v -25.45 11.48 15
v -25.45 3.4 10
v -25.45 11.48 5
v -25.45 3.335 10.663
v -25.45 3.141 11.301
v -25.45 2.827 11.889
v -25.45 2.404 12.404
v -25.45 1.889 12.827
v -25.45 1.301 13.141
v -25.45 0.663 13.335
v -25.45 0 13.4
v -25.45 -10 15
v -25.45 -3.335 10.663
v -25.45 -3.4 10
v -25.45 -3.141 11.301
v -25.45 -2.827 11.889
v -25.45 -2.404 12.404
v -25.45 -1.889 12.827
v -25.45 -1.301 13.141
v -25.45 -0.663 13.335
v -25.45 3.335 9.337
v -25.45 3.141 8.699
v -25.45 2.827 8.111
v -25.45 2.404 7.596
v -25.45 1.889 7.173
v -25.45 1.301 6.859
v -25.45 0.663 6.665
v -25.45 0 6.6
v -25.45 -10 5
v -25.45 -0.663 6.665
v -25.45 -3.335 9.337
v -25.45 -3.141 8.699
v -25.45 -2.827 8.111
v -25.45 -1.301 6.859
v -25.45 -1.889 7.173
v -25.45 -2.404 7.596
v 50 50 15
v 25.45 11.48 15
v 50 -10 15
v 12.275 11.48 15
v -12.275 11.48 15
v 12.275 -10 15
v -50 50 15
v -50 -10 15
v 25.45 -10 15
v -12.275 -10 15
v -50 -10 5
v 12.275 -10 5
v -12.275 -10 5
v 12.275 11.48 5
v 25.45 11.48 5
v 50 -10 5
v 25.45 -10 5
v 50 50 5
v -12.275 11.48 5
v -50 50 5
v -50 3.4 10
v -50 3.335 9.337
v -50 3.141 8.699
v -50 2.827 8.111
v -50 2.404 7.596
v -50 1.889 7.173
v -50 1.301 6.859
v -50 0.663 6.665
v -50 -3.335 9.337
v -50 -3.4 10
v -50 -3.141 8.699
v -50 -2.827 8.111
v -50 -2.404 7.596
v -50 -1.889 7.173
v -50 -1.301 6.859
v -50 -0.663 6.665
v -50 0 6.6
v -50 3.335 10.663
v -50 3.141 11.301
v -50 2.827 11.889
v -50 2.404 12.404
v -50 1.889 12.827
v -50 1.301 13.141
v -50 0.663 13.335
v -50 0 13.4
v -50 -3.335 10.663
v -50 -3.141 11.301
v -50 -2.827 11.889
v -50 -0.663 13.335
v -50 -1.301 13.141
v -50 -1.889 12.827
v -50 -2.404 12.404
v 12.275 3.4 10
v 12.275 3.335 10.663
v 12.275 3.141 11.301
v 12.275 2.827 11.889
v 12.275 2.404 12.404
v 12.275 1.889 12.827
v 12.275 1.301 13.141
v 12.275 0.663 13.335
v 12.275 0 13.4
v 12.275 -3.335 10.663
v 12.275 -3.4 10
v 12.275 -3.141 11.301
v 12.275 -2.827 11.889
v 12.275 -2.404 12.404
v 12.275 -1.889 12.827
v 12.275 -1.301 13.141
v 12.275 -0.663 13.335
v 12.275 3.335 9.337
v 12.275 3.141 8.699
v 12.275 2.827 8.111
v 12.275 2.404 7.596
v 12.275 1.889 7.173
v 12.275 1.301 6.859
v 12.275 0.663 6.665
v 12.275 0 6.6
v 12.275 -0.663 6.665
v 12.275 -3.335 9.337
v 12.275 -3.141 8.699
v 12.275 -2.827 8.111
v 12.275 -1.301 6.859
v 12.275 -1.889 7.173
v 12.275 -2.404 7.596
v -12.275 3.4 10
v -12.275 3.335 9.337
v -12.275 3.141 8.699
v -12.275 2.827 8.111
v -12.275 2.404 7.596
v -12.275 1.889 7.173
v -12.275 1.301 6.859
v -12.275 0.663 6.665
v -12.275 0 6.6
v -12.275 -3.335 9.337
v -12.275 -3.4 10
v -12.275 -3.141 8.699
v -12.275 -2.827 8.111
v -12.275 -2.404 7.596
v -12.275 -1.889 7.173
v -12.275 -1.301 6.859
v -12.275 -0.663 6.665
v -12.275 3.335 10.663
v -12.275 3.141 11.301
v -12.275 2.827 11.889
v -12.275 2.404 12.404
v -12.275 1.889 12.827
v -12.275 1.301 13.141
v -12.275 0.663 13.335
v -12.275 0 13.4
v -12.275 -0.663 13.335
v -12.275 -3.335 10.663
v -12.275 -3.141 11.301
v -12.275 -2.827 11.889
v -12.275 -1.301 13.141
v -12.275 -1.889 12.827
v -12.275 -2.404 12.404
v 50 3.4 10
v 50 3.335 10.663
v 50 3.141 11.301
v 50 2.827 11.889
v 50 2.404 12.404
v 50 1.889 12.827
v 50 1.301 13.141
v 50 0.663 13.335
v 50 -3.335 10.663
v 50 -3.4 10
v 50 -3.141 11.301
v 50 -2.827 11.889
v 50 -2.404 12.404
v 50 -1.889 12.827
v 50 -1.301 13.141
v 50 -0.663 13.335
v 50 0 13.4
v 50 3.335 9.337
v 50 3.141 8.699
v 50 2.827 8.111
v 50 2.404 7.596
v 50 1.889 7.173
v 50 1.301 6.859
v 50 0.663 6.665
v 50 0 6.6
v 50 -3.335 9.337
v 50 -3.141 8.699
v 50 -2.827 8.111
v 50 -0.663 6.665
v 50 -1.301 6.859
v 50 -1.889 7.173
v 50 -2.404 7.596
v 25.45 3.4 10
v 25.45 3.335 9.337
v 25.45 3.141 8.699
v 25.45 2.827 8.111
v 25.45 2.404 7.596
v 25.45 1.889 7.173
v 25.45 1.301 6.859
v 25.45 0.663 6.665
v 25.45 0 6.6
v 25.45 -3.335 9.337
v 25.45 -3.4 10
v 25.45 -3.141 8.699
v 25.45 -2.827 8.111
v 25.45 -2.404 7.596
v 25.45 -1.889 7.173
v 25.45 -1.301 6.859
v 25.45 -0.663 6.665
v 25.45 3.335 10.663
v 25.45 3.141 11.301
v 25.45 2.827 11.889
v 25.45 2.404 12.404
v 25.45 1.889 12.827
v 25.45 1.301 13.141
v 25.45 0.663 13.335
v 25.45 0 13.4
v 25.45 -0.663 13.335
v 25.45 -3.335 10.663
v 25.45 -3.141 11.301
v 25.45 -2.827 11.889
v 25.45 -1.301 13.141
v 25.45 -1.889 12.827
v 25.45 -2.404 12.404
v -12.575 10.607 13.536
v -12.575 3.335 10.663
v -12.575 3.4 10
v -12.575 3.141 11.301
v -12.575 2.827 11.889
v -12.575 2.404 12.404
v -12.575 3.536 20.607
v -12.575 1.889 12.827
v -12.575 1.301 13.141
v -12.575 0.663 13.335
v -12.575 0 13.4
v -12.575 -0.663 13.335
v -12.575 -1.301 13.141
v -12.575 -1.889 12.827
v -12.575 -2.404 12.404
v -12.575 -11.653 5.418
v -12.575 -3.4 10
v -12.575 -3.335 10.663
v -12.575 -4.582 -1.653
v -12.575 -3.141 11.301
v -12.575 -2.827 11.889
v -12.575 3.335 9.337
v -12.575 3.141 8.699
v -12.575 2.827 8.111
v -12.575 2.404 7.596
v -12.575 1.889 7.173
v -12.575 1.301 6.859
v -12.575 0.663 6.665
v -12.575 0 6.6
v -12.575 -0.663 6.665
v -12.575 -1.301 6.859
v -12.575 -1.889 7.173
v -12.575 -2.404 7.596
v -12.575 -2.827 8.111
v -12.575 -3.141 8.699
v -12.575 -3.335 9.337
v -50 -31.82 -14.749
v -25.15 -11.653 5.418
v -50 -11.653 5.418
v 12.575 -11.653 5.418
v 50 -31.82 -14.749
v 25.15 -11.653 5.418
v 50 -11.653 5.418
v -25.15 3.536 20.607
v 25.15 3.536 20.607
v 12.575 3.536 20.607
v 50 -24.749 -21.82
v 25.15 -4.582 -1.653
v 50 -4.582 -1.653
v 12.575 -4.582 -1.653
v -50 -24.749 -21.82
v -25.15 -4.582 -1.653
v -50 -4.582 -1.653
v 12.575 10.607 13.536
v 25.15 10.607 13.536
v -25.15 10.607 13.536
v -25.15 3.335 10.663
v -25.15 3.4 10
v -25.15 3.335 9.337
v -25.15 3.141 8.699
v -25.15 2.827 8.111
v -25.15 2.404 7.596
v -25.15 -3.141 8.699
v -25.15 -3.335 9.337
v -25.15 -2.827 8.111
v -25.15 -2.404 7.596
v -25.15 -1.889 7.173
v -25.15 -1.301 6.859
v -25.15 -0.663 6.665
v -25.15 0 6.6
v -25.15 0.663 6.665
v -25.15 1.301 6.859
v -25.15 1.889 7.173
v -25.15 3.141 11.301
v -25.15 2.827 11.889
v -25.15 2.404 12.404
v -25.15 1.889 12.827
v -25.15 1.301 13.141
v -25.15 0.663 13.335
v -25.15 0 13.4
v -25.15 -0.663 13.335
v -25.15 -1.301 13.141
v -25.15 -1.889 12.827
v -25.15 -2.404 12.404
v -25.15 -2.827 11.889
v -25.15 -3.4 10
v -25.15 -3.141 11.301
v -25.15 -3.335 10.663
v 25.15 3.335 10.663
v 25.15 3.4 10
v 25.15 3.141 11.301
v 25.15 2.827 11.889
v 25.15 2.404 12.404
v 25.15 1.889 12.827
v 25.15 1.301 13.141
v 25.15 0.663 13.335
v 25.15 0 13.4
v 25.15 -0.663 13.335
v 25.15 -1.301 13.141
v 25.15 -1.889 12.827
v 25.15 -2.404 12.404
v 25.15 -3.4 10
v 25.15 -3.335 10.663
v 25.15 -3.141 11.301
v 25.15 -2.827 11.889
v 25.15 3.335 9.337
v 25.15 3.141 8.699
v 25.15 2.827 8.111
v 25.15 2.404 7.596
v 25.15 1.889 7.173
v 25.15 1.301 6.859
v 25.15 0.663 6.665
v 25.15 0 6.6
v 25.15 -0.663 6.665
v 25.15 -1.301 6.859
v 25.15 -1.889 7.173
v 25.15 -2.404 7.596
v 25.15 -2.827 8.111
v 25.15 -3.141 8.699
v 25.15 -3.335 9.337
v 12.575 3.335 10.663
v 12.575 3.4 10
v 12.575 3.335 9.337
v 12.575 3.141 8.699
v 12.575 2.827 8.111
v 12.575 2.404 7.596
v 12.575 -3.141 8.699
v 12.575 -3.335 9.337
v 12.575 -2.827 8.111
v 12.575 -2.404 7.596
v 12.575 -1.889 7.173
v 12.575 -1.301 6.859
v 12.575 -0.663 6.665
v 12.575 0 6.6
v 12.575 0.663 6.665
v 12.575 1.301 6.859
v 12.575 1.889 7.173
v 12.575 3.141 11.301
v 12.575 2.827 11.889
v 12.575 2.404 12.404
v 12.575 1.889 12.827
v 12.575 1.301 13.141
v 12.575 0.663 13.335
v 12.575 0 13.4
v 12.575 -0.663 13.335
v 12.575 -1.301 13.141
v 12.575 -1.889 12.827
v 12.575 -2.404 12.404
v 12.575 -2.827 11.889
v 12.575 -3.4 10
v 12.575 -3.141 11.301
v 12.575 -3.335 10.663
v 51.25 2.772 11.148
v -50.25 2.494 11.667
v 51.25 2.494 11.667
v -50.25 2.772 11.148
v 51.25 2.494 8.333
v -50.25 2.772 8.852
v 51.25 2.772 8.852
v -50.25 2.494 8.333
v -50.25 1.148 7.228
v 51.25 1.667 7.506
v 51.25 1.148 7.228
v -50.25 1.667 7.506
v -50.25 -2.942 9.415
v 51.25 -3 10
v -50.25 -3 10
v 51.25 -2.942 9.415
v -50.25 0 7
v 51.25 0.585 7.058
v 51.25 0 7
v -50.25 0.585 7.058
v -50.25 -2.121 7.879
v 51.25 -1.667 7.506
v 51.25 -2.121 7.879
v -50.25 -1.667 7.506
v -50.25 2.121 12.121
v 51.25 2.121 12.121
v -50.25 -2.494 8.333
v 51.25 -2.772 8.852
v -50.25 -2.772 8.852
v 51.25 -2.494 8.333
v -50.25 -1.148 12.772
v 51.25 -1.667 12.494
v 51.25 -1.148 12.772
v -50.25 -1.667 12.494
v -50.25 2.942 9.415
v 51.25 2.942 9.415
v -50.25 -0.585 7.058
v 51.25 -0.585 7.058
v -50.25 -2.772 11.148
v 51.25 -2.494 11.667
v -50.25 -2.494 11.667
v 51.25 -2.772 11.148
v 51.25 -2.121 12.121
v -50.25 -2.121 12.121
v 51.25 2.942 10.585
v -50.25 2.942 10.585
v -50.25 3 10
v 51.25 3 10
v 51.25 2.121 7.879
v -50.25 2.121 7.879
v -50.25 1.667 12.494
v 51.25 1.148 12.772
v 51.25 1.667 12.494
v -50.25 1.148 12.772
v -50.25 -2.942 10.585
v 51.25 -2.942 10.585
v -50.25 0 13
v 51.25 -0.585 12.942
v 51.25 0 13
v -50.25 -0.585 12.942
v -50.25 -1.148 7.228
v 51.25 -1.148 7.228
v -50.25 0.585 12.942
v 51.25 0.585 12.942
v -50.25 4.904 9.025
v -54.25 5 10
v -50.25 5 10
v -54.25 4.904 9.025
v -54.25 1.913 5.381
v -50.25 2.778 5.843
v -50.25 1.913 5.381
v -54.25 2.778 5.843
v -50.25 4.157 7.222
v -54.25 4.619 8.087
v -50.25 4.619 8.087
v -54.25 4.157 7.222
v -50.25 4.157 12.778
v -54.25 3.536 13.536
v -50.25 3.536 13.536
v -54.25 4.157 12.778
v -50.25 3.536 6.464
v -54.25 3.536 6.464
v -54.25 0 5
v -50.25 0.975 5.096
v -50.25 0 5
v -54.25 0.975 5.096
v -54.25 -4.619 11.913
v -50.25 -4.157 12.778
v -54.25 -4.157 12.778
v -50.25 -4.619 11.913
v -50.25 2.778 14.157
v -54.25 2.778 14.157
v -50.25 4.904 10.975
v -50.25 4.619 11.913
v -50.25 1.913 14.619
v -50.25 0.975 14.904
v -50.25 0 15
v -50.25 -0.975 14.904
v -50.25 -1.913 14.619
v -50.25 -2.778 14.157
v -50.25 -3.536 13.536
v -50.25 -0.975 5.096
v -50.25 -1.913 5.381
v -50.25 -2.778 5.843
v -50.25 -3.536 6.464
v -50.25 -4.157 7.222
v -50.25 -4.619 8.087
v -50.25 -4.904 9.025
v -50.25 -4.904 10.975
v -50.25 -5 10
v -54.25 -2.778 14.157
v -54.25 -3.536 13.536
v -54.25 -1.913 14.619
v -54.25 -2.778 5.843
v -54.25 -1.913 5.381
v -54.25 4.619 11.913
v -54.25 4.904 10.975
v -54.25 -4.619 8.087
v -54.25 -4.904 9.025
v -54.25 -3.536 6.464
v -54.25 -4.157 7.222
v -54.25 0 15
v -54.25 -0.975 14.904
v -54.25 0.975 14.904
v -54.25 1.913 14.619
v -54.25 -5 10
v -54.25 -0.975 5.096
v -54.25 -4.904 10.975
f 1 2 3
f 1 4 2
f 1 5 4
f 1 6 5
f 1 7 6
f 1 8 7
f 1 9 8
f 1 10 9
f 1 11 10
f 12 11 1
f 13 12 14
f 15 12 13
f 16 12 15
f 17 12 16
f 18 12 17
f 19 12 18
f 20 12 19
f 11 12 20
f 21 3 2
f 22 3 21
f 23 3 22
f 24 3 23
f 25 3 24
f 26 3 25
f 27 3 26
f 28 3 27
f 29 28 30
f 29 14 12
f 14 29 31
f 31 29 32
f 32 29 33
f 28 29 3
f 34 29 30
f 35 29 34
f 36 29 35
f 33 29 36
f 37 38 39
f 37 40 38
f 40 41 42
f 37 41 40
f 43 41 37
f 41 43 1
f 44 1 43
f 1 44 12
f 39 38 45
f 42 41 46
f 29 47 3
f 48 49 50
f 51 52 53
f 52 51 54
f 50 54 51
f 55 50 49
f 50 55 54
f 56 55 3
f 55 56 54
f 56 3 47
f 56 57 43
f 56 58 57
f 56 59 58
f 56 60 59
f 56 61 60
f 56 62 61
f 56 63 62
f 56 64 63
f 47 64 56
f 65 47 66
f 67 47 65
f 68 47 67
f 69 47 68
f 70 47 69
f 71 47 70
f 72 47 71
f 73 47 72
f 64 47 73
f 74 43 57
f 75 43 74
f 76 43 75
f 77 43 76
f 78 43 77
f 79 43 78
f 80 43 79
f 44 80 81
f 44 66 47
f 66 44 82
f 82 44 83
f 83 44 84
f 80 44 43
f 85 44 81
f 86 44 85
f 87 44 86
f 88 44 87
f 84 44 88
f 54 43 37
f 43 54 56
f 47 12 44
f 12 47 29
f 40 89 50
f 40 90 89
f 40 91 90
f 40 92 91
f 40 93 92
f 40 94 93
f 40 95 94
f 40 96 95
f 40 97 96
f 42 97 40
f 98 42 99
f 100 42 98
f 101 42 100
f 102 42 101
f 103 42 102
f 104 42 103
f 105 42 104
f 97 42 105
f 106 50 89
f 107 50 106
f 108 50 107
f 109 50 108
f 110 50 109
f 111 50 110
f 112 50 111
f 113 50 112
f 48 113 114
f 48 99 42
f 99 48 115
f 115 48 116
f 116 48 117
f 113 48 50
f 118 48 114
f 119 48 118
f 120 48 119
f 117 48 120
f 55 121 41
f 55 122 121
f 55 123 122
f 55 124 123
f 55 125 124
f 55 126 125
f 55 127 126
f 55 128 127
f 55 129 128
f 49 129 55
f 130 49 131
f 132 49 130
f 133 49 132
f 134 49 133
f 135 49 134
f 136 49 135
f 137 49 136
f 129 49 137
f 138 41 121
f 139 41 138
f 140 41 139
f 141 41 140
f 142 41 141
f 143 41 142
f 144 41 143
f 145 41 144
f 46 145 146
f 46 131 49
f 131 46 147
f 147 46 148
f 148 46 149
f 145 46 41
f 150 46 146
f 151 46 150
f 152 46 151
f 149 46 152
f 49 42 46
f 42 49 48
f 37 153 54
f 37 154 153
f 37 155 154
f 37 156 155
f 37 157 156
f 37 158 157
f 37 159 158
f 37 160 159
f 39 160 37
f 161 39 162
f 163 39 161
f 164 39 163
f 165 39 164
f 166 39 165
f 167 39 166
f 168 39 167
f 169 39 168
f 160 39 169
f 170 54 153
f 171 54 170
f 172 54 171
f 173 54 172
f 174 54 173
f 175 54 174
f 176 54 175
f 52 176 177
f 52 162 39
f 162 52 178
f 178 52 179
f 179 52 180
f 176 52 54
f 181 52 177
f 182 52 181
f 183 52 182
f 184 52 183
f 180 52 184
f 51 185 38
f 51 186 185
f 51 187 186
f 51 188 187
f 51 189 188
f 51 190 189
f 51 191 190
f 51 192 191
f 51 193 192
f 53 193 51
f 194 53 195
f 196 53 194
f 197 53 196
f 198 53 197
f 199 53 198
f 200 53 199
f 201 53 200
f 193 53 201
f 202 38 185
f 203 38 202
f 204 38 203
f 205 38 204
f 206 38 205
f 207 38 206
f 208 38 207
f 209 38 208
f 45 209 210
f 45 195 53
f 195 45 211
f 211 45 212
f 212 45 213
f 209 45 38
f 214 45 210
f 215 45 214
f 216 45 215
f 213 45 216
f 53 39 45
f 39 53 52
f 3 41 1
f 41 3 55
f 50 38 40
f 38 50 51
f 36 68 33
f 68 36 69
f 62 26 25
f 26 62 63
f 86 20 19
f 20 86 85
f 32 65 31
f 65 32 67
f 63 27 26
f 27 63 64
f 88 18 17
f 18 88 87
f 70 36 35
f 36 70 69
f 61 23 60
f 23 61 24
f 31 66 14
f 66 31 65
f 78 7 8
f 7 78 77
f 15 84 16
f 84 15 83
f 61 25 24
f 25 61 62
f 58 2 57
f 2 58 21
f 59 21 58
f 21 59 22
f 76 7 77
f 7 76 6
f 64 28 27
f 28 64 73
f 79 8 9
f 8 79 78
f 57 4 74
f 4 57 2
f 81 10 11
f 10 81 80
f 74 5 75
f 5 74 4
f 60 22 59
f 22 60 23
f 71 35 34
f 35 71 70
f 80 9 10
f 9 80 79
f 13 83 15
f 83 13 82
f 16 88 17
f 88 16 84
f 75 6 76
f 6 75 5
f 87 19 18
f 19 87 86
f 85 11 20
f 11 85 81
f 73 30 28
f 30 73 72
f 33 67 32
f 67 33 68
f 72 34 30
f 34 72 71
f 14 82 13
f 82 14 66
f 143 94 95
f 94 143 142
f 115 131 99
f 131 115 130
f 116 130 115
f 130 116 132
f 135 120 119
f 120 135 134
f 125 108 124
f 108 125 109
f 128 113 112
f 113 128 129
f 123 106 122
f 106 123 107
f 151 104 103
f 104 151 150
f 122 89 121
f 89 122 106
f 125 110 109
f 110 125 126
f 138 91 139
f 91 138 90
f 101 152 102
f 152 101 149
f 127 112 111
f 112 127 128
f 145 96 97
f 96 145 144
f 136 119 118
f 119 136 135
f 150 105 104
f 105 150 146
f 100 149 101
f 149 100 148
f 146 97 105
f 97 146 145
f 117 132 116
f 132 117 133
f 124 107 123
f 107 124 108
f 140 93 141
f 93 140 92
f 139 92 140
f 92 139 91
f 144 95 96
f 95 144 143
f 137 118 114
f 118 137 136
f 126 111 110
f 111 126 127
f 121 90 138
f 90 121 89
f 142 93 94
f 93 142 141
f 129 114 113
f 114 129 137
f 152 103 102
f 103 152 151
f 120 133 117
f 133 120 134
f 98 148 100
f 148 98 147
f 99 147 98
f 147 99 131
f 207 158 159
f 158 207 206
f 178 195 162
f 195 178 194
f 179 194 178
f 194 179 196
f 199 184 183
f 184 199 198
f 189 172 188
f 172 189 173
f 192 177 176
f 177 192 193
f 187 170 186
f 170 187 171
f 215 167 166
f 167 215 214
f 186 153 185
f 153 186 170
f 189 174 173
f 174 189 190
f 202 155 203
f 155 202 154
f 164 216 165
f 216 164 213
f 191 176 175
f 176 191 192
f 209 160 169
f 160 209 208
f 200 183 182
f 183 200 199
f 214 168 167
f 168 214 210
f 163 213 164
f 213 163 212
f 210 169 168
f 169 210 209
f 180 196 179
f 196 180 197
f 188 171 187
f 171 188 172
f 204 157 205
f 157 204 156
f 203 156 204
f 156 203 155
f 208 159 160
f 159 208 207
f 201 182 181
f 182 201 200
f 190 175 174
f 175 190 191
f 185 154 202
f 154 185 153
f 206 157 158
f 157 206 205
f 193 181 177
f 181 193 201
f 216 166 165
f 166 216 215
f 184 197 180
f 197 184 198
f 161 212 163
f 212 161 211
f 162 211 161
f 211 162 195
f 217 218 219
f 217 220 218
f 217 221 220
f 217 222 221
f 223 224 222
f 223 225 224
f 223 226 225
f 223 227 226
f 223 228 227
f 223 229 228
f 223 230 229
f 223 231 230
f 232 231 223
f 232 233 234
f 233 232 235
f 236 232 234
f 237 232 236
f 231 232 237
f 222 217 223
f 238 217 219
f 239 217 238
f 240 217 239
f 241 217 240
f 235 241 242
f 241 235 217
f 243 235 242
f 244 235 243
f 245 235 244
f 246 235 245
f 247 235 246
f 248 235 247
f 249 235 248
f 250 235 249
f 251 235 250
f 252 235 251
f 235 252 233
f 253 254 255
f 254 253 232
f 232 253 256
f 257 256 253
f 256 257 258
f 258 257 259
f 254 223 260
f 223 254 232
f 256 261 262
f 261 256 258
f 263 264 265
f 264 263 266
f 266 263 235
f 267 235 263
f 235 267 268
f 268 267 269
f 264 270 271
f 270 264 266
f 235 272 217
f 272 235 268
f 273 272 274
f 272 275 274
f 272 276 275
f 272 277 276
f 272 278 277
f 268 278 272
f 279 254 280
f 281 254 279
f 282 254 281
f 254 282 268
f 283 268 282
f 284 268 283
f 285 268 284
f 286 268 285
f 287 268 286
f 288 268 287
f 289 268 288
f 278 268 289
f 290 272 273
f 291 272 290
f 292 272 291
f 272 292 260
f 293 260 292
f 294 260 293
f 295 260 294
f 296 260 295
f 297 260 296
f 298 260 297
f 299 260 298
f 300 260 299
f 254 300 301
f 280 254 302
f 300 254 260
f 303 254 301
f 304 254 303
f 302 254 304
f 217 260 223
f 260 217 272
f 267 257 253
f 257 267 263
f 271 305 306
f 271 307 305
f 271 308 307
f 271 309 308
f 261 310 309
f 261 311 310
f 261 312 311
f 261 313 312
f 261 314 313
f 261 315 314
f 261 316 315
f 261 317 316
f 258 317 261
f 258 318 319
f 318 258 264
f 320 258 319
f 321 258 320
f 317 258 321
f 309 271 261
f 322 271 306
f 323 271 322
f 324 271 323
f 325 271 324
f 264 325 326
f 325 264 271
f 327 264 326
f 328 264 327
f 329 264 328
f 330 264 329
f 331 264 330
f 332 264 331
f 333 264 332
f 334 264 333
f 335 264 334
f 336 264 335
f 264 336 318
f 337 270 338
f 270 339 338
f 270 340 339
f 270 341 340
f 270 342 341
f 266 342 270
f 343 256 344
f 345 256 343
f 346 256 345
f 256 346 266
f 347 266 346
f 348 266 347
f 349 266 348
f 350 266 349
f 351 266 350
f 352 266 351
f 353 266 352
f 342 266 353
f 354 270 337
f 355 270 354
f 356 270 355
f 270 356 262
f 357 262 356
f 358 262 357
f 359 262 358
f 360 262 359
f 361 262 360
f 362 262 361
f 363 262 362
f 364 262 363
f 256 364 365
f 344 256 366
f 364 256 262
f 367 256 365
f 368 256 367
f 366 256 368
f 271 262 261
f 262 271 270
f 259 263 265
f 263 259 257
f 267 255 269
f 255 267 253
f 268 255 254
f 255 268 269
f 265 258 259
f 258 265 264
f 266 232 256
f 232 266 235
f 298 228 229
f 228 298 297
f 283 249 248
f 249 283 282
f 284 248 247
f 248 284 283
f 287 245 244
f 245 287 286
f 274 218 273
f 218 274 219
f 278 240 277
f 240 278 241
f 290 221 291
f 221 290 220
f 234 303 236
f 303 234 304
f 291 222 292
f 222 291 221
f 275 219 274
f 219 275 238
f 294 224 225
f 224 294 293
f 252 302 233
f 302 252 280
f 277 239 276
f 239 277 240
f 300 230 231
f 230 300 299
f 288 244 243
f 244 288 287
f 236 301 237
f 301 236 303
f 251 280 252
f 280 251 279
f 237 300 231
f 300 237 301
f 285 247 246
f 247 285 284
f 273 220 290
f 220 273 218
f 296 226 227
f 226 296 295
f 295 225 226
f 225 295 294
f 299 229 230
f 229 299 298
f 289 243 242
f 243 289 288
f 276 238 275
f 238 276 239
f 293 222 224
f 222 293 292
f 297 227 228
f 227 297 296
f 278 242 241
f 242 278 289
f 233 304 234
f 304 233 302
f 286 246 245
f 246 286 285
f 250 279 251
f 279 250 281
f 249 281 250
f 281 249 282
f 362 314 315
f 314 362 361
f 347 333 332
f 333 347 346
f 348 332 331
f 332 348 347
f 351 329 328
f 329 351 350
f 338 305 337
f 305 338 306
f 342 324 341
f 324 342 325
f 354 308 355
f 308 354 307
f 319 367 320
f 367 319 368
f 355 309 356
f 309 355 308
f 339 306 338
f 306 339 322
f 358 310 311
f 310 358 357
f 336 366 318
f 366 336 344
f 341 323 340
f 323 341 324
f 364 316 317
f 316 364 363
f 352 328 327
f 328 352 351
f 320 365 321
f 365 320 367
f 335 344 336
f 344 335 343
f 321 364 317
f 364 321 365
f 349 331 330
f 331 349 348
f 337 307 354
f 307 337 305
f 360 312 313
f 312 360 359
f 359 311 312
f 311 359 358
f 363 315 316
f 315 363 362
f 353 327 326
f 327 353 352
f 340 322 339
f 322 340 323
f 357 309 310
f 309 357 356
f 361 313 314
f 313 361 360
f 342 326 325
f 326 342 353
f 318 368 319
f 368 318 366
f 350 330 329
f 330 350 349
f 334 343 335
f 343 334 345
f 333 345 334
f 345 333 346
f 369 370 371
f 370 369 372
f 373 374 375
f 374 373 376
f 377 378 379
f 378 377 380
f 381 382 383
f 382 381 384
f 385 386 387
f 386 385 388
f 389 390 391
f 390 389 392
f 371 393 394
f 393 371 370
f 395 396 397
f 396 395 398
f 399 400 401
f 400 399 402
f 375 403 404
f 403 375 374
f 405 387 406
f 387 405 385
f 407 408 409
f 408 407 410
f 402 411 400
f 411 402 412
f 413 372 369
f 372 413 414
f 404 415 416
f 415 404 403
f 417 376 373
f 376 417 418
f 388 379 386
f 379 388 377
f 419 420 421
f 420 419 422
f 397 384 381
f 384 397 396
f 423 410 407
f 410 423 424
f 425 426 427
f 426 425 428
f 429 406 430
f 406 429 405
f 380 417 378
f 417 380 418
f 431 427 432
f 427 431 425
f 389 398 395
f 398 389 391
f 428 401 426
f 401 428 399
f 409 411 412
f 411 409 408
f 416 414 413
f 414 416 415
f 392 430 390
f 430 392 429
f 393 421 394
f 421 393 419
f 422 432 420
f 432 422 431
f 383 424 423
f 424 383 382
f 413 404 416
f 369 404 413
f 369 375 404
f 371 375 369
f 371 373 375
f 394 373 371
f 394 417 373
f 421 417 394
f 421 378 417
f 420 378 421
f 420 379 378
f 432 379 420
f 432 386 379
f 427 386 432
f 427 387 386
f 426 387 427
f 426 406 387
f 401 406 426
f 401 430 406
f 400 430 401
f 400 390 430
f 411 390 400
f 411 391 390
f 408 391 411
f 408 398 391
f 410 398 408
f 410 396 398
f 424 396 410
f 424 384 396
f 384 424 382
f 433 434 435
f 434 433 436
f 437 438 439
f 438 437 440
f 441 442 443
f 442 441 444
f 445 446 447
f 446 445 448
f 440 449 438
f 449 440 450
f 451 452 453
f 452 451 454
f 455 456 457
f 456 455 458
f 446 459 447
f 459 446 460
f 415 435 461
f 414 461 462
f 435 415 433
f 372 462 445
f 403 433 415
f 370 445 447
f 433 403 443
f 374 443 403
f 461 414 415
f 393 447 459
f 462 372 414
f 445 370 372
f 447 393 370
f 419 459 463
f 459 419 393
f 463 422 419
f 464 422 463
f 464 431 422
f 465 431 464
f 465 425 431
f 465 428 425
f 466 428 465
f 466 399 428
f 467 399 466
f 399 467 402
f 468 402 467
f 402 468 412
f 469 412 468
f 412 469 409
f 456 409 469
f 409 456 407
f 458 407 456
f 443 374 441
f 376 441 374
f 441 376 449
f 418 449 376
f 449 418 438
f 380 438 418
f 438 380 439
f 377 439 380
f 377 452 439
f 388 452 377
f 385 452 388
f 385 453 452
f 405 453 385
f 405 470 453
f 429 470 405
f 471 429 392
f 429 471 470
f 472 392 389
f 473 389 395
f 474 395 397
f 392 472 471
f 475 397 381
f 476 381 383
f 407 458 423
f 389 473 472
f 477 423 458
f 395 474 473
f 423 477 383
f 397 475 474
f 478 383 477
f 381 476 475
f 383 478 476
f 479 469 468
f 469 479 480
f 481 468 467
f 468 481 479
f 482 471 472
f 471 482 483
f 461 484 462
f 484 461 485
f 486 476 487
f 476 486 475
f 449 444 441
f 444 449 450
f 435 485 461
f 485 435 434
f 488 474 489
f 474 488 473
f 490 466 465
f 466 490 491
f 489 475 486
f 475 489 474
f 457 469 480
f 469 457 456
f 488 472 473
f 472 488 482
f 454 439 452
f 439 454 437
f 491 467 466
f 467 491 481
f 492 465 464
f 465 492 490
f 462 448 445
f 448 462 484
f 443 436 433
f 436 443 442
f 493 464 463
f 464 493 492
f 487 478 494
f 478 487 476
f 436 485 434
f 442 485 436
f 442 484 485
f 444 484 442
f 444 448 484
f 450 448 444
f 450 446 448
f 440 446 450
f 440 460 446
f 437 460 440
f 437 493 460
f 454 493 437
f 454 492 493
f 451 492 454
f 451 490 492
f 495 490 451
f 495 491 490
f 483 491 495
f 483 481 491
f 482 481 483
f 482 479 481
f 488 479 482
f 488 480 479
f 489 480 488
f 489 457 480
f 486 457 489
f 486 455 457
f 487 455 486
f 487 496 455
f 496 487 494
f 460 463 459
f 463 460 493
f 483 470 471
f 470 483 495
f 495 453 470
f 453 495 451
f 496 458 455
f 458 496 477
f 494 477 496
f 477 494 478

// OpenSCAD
$fn = 32;

// ------------------------------------------------------------------------
// Butt hinge: hinge 100 mm, leaf swung 45 deg
// Every part is its own module, assembly() places every instance.
// ------------------------------------------------------------------------

// --- part 1 ---
module hinge_base() {
  difference() {
    union() {
      translate([-50, -10, -5]) cube([24.55, 60, 10]);
      translate([-12.275, -10, -5]) cube([24.55, 60, 10]);
      translate([25.45, -10, -5]) cube([24.55, 60, 10]);
      translate([-50, 11.48, -5]) cube([100, 38.52, 10]);
    }
    translate([-37.725, 0, 0]) rotate([0, 90, 0]) cylinder(h = 26.55, d = 6.8, center = true);
    translate([0, 0, 0]) rotate([0, 90, 0]) cylinder(h = 26.55, d = 6.8, center = true);
    translate([37.725, 0, 0]) rotate([0, 90, 0]) cylinder(h = 26.55, d = 6.8, center = true);
  }
}

// --- part 2 ---
module hinge_mover() {
  difference() {
    union() {
      translate([-25.15, -40, -5]) cube([12.575, 50, 10]);
      translate([12.575, -40, -5]) cube([12.575, 50, 10]);
      translate([-50, -40, -5]) cube([100, 28.52, 10]);
    }
    translate([-18.863, 0, 0]) rotate([0, 90, 0]) cylinder(h = 14.575, d = 6.8, center = true);
    translate([18.863, 0, 0]) rotate([0, 90, 0]) cylinder(h = 14.575, d = 6.8, center = true);
  }
}

// --- part 3 ---
module hinge_pin() {
  rotate([0, 90, 0]) cylinder(h = 102.5, d = 6, center = true);
  translate([-54.25, 0, 0]) rotate([0, 90, 0]) cylinder(h = 4, d = 10);
}

// --- assembly ---
module assembly() {
  color([0.80, 0.24, 0.20]) translate([0, 0, 10]) rotate([0, 0, 0]) hinge_base();
  color([0.20, 0.45, 0.75]) translate([0, 0, 10]) rotate([45, 0, 0]) hinge_mover();
  color([0.25, 0.62, 0.32]) translate([0, 0, 10]) rotate([0, 0, 0]) hinge_pin();
}

assembly();
